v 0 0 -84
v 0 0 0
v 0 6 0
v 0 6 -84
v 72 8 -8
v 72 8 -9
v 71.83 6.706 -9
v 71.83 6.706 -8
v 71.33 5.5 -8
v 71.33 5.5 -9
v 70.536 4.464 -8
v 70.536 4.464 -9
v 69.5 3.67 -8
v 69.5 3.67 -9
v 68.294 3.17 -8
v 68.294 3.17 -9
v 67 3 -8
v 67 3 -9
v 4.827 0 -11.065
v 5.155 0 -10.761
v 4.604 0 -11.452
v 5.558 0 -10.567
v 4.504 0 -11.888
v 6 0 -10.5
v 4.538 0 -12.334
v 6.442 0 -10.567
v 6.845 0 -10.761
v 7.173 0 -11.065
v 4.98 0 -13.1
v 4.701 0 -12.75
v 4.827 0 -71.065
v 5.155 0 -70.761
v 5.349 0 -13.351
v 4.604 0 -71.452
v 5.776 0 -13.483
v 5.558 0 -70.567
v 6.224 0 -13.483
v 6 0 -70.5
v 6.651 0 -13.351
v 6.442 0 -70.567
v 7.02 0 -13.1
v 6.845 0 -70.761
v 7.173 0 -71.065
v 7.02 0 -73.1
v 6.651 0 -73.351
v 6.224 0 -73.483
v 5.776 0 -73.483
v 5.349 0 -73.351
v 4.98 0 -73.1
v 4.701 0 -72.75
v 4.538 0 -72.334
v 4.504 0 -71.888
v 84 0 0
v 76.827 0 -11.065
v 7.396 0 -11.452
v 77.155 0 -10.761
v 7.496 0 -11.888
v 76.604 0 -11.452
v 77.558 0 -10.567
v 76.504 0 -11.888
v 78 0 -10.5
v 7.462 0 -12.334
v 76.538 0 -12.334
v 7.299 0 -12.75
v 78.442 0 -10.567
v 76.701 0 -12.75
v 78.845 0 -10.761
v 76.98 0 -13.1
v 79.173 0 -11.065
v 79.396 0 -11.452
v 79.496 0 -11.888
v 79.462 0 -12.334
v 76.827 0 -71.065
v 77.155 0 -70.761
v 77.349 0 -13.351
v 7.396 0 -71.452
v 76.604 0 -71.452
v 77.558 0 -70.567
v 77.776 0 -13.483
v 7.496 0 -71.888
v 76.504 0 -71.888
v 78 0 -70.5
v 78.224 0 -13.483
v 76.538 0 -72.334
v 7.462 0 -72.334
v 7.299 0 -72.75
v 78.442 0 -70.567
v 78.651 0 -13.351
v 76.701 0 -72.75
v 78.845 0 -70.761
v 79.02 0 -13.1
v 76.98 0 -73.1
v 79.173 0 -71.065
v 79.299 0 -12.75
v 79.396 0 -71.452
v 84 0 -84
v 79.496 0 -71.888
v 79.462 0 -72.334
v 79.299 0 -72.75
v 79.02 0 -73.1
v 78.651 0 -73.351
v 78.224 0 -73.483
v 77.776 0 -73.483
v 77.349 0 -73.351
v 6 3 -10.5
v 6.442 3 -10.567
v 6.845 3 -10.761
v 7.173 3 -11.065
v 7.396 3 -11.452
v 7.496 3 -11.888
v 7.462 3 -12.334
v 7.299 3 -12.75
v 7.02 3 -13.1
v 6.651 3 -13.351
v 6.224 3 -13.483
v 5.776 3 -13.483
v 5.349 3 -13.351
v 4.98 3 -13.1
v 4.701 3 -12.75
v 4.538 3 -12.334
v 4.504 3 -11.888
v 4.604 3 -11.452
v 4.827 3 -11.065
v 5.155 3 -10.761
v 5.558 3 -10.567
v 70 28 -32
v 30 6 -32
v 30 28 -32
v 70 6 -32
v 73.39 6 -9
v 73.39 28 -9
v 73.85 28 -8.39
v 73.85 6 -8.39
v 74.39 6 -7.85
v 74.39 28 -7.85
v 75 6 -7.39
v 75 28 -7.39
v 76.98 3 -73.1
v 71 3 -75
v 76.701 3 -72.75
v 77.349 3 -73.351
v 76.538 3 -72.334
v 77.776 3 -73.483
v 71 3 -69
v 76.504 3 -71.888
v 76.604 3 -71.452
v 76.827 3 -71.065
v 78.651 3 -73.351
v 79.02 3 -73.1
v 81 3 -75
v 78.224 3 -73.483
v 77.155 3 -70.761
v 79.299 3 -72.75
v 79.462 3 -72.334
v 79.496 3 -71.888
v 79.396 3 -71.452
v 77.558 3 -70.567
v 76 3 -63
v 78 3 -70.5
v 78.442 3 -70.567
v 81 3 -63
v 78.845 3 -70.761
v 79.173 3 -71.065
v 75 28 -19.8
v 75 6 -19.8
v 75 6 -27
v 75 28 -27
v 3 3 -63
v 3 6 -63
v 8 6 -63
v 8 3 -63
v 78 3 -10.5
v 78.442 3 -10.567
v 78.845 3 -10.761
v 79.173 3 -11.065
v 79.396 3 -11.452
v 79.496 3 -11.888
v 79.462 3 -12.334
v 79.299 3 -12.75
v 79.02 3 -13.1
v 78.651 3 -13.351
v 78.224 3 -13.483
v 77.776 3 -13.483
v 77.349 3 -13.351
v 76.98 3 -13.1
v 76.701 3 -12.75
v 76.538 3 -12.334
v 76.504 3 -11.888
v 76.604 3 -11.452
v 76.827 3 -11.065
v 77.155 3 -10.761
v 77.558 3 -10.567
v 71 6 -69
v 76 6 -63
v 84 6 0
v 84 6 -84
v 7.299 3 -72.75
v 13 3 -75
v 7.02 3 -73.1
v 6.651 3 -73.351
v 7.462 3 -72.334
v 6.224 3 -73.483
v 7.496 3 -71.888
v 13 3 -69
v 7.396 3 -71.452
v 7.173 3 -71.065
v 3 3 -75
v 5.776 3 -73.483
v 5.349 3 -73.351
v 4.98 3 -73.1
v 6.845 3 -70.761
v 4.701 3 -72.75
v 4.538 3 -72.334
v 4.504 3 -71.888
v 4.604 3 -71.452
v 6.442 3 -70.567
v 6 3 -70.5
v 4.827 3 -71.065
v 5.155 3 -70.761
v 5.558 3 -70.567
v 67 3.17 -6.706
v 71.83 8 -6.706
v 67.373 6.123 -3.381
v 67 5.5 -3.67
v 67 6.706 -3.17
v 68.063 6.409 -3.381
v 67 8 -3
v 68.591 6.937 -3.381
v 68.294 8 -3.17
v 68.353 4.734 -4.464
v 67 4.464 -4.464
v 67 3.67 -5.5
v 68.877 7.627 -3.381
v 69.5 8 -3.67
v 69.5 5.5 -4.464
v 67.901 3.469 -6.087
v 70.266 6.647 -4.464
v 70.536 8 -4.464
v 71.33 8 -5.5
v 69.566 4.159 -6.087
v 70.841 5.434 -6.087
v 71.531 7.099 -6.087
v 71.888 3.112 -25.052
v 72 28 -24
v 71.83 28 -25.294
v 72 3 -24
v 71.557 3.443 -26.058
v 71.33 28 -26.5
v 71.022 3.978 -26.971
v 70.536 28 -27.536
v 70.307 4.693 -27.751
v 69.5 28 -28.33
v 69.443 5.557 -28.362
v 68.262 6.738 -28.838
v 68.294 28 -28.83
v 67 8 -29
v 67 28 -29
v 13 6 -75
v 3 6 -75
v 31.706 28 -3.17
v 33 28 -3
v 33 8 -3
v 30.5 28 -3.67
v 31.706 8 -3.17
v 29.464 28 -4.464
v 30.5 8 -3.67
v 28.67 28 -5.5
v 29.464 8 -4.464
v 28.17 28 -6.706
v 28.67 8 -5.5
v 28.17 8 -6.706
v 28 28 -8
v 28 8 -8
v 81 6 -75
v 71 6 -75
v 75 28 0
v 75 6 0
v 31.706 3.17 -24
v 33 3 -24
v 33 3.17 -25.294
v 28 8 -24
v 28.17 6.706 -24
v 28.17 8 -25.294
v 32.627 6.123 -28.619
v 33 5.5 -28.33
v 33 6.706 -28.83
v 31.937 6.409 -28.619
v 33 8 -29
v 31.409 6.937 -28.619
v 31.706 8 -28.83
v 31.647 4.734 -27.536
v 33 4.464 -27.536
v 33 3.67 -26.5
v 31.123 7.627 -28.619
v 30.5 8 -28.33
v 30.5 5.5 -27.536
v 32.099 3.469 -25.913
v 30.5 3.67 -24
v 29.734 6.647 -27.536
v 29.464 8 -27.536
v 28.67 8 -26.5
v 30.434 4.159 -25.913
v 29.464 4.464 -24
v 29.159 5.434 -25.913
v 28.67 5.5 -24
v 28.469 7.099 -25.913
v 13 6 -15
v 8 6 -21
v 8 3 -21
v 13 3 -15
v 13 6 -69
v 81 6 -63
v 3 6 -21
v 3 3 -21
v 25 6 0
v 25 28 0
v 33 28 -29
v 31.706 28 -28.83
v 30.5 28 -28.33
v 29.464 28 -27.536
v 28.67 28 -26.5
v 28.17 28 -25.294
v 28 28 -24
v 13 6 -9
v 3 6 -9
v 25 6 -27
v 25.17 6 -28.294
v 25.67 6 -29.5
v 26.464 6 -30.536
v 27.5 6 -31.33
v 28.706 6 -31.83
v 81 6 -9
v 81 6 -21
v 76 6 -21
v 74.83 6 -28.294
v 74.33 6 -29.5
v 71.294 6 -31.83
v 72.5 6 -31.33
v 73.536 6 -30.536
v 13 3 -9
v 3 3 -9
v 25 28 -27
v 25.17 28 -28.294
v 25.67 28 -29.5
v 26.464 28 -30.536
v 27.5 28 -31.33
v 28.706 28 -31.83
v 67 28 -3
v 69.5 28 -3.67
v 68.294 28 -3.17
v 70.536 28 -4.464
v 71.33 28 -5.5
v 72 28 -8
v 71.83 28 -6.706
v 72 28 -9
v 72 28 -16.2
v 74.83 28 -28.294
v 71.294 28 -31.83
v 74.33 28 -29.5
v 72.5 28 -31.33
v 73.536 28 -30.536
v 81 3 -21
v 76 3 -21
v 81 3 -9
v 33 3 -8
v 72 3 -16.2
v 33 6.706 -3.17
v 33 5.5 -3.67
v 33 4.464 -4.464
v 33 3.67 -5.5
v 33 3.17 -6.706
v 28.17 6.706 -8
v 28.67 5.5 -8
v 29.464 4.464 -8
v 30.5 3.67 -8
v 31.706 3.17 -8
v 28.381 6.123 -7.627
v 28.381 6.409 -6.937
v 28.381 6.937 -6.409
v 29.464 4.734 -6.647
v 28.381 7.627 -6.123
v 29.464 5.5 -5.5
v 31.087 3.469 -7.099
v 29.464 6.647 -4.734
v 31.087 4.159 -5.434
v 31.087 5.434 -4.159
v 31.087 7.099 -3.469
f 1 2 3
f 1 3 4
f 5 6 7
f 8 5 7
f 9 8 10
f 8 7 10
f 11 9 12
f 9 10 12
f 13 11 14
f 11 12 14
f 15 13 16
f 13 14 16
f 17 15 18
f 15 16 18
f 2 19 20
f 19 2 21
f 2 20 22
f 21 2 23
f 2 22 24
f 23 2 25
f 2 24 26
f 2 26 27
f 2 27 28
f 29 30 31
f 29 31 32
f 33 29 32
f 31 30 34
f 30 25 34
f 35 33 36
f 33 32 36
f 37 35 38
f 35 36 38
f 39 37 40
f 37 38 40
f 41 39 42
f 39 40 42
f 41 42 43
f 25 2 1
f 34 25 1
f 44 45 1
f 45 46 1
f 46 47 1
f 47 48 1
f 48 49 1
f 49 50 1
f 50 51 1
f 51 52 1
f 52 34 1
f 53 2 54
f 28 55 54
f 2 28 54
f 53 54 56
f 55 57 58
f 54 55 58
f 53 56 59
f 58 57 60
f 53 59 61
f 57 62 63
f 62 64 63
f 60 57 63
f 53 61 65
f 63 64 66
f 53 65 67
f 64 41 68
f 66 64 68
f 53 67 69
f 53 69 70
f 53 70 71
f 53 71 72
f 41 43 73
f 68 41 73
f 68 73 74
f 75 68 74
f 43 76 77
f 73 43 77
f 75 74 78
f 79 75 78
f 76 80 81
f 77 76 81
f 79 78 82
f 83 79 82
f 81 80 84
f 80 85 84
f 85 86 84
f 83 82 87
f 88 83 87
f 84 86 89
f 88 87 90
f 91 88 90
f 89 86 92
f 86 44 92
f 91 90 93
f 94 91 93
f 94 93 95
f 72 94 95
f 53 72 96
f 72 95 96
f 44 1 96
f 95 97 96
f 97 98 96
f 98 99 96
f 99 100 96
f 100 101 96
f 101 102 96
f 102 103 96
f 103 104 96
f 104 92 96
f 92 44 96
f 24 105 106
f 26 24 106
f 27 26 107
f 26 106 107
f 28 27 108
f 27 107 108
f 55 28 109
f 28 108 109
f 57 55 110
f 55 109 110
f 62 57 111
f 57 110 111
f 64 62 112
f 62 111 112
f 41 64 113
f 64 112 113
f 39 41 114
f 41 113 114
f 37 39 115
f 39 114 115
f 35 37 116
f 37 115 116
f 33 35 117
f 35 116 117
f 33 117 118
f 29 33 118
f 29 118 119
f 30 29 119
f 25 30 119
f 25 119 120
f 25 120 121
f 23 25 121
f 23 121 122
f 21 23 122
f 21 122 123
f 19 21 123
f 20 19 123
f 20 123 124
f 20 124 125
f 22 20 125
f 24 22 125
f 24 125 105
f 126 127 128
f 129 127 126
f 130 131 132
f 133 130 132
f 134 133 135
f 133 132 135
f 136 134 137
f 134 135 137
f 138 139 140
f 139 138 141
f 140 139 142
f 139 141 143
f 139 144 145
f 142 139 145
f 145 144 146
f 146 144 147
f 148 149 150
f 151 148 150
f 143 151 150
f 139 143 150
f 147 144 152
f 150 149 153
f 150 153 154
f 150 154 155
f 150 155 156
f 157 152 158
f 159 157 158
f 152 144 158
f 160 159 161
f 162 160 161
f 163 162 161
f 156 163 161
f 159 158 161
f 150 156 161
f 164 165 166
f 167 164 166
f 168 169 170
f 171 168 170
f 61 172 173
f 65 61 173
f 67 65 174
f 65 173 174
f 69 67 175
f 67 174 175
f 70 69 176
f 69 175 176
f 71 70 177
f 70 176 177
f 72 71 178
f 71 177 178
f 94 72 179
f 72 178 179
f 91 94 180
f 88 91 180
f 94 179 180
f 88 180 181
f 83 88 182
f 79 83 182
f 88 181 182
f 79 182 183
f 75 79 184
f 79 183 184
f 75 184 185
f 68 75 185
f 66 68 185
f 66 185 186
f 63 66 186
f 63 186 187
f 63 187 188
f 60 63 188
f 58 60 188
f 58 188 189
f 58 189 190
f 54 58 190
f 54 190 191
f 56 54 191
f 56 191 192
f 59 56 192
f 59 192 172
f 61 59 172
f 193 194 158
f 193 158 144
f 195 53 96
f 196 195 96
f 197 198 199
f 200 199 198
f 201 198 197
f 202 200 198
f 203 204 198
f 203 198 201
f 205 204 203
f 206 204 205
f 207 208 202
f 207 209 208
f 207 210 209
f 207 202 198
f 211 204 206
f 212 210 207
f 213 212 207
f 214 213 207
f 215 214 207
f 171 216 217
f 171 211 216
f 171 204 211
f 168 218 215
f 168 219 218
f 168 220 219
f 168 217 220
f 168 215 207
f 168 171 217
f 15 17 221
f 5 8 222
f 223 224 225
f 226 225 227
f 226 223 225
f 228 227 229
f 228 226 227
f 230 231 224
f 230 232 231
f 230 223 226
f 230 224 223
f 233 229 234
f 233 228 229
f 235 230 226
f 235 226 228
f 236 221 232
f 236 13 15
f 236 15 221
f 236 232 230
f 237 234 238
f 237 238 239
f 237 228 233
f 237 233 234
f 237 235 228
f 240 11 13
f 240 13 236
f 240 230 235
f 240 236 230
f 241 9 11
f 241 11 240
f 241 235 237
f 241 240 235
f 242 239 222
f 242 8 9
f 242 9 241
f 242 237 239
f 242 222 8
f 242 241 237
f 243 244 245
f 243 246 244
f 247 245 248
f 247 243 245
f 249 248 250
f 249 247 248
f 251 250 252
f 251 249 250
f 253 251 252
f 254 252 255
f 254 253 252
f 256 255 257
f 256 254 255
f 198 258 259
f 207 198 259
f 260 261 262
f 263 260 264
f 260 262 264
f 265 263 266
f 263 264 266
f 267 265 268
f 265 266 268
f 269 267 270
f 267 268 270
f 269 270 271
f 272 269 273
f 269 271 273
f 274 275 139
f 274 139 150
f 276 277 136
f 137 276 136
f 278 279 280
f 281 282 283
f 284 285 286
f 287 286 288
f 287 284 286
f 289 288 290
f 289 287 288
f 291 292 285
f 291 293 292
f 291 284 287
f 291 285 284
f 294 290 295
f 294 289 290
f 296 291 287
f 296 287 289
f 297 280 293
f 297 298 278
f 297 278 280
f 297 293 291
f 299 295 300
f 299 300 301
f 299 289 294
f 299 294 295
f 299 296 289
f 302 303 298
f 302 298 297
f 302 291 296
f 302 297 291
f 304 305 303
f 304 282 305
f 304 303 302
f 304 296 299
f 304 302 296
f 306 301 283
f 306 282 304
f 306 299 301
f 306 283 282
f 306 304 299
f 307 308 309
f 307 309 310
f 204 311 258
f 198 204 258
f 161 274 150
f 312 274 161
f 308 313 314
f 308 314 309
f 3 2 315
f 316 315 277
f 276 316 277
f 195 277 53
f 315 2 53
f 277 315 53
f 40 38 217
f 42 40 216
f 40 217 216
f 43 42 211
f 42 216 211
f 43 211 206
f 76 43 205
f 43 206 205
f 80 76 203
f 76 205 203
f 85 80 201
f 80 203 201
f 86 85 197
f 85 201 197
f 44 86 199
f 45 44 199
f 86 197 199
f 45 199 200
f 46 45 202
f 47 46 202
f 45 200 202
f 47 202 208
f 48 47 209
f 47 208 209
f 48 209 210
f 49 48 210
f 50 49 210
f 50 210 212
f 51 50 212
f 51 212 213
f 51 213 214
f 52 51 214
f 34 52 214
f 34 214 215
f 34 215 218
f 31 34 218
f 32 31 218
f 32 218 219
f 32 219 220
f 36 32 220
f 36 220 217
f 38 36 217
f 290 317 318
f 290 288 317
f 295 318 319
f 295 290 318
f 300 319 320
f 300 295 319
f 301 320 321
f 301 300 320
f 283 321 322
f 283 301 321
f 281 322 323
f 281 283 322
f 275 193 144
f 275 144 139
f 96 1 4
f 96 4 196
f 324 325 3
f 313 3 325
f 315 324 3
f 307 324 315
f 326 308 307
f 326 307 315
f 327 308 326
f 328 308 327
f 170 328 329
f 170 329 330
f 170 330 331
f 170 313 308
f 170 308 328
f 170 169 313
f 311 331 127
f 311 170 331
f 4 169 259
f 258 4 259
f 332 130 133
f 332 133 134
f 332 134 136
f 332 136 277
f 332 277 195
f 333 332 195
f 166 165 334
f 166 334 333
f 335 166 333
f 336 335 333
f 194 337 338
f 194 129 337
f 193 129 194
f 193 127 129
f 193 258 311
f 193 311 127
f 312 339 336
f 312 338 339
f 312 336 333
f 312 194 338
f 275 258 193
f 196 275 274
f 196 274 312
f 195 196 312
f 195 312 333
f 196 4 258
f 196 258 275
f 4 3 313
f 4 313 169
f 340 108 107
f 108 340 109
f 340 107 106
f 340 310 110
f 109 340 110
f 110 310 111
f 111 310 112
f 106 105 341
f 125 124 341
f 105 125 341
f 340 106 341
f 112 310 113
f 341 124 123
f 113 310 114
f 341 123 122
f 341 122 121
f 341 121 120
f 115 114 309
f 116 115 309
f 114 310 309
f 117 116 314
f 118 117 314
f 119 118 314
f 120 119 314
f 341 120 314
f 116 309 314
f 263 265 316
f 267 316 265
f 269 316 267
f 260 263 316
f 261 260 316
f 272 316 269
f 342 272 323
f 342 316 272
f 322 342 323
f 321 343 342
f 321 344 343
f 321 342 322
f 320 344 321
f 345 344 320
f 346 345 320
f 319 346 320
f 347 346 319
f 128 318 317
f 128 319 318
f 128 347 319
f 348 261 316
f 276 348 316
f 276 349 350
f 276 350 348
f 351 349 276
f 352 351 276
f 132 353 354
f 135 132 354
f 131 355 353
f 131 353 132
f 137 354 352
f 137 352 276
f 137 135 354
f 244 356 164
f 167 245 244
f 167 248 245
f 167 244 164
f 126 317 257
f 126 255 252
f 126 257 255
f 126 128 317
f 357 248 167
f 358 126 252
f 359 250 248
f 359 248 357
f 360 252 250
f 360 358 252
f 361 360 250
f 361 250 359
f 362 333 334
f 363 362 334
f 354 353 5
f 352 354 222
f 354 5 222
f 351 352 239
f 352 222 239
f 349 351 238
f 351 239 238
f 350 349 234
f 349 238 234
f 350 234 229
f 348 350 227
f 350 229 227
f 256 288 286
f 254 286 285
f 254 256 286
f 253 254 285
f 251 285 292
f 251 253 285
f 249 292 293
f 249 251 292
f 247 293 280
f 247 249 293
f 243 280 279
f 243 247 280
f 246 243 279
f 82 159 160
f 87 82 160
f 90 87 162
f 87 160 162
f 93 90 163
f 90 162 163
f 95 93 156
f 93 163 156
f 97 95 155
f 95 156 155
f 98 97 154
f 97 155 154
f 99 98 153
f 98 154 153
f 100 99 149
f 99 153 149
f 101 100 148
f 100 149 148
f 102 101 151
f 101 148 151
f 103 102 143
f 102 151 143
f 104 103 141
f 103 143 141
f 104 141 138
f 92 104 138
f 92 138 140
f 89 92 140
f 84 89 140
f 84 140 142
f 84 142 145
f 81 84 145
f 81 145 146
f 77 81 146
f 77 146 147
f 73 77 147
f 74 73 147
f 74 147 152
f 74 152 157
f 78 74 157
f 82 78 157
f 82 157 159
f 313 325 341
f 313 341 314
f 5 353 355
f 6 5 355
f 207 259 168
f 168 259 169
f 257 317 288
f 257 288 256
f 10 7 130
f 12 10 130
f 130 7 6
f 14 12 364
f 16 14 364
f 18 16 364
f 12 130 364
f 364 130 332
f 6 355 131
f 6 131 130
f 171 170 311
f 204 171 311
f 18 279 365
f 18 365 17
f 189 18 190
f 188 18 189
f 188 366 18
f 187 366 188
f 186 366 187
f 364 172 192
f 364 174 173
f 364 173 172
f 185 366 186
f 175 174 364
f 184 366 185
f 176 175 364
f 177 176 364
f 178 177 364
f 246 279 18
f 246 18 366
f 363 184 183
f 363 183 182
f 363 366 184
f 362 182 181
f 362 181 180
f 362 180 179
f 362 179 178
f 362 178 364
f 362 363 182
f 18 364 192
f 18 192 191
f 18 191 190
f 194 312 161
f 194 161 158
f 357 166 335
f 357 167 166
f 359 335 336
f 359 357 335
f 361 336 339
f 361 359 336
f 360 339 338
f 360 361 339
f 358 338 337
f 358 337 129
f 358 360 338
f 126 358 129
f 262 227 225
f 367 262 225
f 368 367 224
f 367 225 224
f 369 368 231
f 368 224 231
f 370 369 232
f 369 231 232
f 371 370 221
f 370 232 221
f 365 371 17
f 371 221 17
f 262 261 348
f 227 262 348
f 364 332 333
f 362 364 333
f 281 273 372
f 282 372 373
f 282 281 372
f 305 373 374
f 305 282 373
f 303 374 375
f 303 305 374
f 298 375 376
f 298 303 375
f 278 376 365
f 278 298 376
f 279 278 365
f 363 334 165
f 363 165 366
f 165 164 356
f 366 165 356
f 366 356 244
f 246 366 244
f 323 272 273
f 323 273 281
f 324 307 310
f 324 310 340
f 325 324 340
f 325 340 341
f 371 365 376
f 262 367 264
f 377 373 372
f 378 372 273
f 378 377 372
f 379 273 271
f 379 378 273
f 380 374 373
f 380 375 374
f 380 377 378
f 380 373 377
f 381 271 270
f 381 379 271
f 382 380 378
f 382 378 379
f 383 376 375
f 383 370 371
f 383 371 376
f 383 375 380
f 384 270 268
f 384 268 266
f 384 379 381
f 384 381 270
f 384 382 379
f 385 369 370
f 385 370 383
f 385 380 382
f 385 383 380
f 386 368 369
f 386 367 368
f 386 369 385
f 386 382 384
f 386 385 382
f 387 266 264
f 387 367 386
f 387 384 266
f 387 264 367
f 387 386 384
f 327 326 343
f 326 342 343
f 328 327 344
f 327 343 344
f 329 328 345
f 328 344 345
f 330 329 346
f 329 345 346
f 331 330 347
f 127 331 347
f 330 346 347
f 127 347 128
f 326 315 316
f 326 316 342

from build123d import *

# Parameters (mm, degrees)
SKETCH1_W               = 84
SKETCH1_H               = 84
BOSS_EXTRUDE1_DEPTH     = 6
SKETCH2_R               = 1.5
CUT_EXTRUDE1_DEPTH      = 119.94536561
SKETCH4_R               = 1.5
CUT_EXTRUDE4_DEPTH      = 3
MIRROR3_COPY_1_SKETCH_R = 1.5
MIRROR3_COPY_1_DEPTH    = 3
SKETCH5_W               = 50
SKETCH5_H               = 32
BOSS_EXTRUDE2_DEPTH     = 22
SKETCH6_W               = 44
SKETCH6_H               = 26
CUT_EXTRUDE5_DEPTH      = 25
SKETCH8_R               = 5.5
CUT_EXTRUDE14_DEPTH     = 22
CUT_EXTRUDE15_DEPTH     = 122.396046064
FILLET2_R               = 5
FILLET3_R               = 5


with BuildPart() as part:
    # Sketch1 → Boss-Extrude1 (new body)
    with BuildSketch(Plane(origin=(0, 0, 0), x_dir=(1, 0, 0), z_dir=(0, 1, 0))):
        with Locations((42, 42)):
            Rectangle(SKETCH1_W, SKETCH1_H)
    extrude(amount=BOSS_EXTRUDE1_DEPTH)

    # Sketch2 → Cut-Extrude1 (cut, through all)
    with BuildSketch(Plane(origin=(0, 6, 0), x_dir=(1, 0, 0), z_dir=(0, 1, 0))):
        with Locations(Location((6, 72, 0), (0, 0, 270))):
            Circle(SKETCH2_R)
        with Locations(Location((6, 12, 0), (0, 0, 270))):
            Circle(SKETCH2_R)
        with Locations(Location((78, 12, 0), (0, 0, 270))):
            Circle(SKETCH2_R)
        with Locations(Location((78, 72, 0), (0, 0, 270))):
            Circle(SKETCH2_R)
    extrude(amount=-CUT_EXTRUDE1_DEPTH, mode=Mode.SUBTRACT)

    # Sketch4 → Cut-Extrude4 (cut)
    with BuildSketch(Plane(origin=(0, 6, 0), x_dir=(1, 0, 0), z_dir=(0, 1, 0))):
        Polygon((13, 15), (13, 9), (3, 9), (3, 21), (8, 21), align=None)
        with Locations(Location((6, 12, 0), (0, 0, 270))):
            Circle(SKETCH4_R, mode=Mode.SUBTRACT)
    cut_extrude4 = extrude(amount=-CUT_EXTRUDE4_DEPTH, mode=Mode.SUBTRACT)

    # Mirror2: Cut-Extrude4 across plane
    add(cut_extrude4.mirror(Plane.XY.offset(-42)), mode=Mode.SUBTRACT)

    # Mirror3: Cut-Extrude4 across plane
    add(cut_extrude4.mirror(Plane.ZY.offset(-42)), mode=Mode.SUBTRACT)

    # Mirror3 copy 1 sketch → Mirror3 copy 1 (cut)
    with BuildSketch(Plane(origin=(84, 6, -84), x_dir=(-1, 0, 0), z_dir=(0, 1, 0))):
        Polygon((13, 15), (13, 9), (3, 9), (3, 21), (8, 21), align=None)
        with Locations(Location((6, 12, 0), (0, 0, 270))):
            Circle(MIRROR3_COPY_1_SKETCH_R, mode=Mode.SUBTRACT)
    extrude(amount=-MIRROR3_COPY_1_DEPTH, mode=Mode.SUBTRACT)

    # Sketch5 → Boss-Extrude2 (add)
    with BuildSketch(Plane(origin=(0, 6, 0), x_dir=(1, 0, 0), z_dir=(0, 1, 0))):
        with Locations((50, 16)):
            Rectangle(SKETCH5_W, SKETCH5_H)
    extrude(amount=BOSS_EXTRUDE2_DEPTH)

    # Sketch6 → Cut-Extrude5 (cut)
    with BuildSketch(Plane(origin=(0, 28, 0), x_dir=(1, 0, 0), z_dir=(0, 1, 0))):
        with Locations((50, 16)):
            Rectangle(SKETCH6_W, SKETCH6_H)
    extrude(amount=-CUT_EXTRUDE5_DEPTH, mode=Mode.SUBTRACT)

    # Sketch8 → Cut-Extrude14 (cut)
    with BuildSketch(Plane(origin=(0, 28, 0), x_dir=(1, 0, 0), z_dir=(0, 1, 0))):
        with Locations((78, 12)):
            Circle(SKETCH8_R)
    extrude(amount=-CUT_EXTRUDE14_DEPTH, mode=Mode.SUBTRACT)

    # Sketch13 → Cut-Extrude15 (cut, through all)
    with BuildSketch(Plane(origin=(0, 3, 0), x_dir=(1, 0, 0), z_dir=(0, 1, 0))):
        Polygon((72, 9), (81, 9), (81, 21), (76, 21), (72, 16.2), (72, 29), (28, 29), (28, 3), (72, 3), align=None)
    extrude(amount=CUT_EXTRUDE15_DEPTH, mode=Mode.SUBTRACT)

    # Fillet2
    fillet2_edges = [part.edges().sort_by_distance(p)[0] for p in [
        (75, 17, -32),
        (25, 17, -32),
    ]]
    fillet(fillet2_edges, radius=FILLET2_R)

    # Fillet3
    fillet3_edges = [part.edges().sort_by_distance(p)[0] for p in [
        (72, 15.5, -29),
        (72, 3, -6),
        (50, 3, -3),
        (72, 15.5, -3),
        (28, 3, -16),
        (28, 15.5, -3),
        (50, 3, -29),
        (28, 15.5, -29),
    ]]
    fillet(fillet3_edges, radius=FILLET3_R)


solid = part.part
